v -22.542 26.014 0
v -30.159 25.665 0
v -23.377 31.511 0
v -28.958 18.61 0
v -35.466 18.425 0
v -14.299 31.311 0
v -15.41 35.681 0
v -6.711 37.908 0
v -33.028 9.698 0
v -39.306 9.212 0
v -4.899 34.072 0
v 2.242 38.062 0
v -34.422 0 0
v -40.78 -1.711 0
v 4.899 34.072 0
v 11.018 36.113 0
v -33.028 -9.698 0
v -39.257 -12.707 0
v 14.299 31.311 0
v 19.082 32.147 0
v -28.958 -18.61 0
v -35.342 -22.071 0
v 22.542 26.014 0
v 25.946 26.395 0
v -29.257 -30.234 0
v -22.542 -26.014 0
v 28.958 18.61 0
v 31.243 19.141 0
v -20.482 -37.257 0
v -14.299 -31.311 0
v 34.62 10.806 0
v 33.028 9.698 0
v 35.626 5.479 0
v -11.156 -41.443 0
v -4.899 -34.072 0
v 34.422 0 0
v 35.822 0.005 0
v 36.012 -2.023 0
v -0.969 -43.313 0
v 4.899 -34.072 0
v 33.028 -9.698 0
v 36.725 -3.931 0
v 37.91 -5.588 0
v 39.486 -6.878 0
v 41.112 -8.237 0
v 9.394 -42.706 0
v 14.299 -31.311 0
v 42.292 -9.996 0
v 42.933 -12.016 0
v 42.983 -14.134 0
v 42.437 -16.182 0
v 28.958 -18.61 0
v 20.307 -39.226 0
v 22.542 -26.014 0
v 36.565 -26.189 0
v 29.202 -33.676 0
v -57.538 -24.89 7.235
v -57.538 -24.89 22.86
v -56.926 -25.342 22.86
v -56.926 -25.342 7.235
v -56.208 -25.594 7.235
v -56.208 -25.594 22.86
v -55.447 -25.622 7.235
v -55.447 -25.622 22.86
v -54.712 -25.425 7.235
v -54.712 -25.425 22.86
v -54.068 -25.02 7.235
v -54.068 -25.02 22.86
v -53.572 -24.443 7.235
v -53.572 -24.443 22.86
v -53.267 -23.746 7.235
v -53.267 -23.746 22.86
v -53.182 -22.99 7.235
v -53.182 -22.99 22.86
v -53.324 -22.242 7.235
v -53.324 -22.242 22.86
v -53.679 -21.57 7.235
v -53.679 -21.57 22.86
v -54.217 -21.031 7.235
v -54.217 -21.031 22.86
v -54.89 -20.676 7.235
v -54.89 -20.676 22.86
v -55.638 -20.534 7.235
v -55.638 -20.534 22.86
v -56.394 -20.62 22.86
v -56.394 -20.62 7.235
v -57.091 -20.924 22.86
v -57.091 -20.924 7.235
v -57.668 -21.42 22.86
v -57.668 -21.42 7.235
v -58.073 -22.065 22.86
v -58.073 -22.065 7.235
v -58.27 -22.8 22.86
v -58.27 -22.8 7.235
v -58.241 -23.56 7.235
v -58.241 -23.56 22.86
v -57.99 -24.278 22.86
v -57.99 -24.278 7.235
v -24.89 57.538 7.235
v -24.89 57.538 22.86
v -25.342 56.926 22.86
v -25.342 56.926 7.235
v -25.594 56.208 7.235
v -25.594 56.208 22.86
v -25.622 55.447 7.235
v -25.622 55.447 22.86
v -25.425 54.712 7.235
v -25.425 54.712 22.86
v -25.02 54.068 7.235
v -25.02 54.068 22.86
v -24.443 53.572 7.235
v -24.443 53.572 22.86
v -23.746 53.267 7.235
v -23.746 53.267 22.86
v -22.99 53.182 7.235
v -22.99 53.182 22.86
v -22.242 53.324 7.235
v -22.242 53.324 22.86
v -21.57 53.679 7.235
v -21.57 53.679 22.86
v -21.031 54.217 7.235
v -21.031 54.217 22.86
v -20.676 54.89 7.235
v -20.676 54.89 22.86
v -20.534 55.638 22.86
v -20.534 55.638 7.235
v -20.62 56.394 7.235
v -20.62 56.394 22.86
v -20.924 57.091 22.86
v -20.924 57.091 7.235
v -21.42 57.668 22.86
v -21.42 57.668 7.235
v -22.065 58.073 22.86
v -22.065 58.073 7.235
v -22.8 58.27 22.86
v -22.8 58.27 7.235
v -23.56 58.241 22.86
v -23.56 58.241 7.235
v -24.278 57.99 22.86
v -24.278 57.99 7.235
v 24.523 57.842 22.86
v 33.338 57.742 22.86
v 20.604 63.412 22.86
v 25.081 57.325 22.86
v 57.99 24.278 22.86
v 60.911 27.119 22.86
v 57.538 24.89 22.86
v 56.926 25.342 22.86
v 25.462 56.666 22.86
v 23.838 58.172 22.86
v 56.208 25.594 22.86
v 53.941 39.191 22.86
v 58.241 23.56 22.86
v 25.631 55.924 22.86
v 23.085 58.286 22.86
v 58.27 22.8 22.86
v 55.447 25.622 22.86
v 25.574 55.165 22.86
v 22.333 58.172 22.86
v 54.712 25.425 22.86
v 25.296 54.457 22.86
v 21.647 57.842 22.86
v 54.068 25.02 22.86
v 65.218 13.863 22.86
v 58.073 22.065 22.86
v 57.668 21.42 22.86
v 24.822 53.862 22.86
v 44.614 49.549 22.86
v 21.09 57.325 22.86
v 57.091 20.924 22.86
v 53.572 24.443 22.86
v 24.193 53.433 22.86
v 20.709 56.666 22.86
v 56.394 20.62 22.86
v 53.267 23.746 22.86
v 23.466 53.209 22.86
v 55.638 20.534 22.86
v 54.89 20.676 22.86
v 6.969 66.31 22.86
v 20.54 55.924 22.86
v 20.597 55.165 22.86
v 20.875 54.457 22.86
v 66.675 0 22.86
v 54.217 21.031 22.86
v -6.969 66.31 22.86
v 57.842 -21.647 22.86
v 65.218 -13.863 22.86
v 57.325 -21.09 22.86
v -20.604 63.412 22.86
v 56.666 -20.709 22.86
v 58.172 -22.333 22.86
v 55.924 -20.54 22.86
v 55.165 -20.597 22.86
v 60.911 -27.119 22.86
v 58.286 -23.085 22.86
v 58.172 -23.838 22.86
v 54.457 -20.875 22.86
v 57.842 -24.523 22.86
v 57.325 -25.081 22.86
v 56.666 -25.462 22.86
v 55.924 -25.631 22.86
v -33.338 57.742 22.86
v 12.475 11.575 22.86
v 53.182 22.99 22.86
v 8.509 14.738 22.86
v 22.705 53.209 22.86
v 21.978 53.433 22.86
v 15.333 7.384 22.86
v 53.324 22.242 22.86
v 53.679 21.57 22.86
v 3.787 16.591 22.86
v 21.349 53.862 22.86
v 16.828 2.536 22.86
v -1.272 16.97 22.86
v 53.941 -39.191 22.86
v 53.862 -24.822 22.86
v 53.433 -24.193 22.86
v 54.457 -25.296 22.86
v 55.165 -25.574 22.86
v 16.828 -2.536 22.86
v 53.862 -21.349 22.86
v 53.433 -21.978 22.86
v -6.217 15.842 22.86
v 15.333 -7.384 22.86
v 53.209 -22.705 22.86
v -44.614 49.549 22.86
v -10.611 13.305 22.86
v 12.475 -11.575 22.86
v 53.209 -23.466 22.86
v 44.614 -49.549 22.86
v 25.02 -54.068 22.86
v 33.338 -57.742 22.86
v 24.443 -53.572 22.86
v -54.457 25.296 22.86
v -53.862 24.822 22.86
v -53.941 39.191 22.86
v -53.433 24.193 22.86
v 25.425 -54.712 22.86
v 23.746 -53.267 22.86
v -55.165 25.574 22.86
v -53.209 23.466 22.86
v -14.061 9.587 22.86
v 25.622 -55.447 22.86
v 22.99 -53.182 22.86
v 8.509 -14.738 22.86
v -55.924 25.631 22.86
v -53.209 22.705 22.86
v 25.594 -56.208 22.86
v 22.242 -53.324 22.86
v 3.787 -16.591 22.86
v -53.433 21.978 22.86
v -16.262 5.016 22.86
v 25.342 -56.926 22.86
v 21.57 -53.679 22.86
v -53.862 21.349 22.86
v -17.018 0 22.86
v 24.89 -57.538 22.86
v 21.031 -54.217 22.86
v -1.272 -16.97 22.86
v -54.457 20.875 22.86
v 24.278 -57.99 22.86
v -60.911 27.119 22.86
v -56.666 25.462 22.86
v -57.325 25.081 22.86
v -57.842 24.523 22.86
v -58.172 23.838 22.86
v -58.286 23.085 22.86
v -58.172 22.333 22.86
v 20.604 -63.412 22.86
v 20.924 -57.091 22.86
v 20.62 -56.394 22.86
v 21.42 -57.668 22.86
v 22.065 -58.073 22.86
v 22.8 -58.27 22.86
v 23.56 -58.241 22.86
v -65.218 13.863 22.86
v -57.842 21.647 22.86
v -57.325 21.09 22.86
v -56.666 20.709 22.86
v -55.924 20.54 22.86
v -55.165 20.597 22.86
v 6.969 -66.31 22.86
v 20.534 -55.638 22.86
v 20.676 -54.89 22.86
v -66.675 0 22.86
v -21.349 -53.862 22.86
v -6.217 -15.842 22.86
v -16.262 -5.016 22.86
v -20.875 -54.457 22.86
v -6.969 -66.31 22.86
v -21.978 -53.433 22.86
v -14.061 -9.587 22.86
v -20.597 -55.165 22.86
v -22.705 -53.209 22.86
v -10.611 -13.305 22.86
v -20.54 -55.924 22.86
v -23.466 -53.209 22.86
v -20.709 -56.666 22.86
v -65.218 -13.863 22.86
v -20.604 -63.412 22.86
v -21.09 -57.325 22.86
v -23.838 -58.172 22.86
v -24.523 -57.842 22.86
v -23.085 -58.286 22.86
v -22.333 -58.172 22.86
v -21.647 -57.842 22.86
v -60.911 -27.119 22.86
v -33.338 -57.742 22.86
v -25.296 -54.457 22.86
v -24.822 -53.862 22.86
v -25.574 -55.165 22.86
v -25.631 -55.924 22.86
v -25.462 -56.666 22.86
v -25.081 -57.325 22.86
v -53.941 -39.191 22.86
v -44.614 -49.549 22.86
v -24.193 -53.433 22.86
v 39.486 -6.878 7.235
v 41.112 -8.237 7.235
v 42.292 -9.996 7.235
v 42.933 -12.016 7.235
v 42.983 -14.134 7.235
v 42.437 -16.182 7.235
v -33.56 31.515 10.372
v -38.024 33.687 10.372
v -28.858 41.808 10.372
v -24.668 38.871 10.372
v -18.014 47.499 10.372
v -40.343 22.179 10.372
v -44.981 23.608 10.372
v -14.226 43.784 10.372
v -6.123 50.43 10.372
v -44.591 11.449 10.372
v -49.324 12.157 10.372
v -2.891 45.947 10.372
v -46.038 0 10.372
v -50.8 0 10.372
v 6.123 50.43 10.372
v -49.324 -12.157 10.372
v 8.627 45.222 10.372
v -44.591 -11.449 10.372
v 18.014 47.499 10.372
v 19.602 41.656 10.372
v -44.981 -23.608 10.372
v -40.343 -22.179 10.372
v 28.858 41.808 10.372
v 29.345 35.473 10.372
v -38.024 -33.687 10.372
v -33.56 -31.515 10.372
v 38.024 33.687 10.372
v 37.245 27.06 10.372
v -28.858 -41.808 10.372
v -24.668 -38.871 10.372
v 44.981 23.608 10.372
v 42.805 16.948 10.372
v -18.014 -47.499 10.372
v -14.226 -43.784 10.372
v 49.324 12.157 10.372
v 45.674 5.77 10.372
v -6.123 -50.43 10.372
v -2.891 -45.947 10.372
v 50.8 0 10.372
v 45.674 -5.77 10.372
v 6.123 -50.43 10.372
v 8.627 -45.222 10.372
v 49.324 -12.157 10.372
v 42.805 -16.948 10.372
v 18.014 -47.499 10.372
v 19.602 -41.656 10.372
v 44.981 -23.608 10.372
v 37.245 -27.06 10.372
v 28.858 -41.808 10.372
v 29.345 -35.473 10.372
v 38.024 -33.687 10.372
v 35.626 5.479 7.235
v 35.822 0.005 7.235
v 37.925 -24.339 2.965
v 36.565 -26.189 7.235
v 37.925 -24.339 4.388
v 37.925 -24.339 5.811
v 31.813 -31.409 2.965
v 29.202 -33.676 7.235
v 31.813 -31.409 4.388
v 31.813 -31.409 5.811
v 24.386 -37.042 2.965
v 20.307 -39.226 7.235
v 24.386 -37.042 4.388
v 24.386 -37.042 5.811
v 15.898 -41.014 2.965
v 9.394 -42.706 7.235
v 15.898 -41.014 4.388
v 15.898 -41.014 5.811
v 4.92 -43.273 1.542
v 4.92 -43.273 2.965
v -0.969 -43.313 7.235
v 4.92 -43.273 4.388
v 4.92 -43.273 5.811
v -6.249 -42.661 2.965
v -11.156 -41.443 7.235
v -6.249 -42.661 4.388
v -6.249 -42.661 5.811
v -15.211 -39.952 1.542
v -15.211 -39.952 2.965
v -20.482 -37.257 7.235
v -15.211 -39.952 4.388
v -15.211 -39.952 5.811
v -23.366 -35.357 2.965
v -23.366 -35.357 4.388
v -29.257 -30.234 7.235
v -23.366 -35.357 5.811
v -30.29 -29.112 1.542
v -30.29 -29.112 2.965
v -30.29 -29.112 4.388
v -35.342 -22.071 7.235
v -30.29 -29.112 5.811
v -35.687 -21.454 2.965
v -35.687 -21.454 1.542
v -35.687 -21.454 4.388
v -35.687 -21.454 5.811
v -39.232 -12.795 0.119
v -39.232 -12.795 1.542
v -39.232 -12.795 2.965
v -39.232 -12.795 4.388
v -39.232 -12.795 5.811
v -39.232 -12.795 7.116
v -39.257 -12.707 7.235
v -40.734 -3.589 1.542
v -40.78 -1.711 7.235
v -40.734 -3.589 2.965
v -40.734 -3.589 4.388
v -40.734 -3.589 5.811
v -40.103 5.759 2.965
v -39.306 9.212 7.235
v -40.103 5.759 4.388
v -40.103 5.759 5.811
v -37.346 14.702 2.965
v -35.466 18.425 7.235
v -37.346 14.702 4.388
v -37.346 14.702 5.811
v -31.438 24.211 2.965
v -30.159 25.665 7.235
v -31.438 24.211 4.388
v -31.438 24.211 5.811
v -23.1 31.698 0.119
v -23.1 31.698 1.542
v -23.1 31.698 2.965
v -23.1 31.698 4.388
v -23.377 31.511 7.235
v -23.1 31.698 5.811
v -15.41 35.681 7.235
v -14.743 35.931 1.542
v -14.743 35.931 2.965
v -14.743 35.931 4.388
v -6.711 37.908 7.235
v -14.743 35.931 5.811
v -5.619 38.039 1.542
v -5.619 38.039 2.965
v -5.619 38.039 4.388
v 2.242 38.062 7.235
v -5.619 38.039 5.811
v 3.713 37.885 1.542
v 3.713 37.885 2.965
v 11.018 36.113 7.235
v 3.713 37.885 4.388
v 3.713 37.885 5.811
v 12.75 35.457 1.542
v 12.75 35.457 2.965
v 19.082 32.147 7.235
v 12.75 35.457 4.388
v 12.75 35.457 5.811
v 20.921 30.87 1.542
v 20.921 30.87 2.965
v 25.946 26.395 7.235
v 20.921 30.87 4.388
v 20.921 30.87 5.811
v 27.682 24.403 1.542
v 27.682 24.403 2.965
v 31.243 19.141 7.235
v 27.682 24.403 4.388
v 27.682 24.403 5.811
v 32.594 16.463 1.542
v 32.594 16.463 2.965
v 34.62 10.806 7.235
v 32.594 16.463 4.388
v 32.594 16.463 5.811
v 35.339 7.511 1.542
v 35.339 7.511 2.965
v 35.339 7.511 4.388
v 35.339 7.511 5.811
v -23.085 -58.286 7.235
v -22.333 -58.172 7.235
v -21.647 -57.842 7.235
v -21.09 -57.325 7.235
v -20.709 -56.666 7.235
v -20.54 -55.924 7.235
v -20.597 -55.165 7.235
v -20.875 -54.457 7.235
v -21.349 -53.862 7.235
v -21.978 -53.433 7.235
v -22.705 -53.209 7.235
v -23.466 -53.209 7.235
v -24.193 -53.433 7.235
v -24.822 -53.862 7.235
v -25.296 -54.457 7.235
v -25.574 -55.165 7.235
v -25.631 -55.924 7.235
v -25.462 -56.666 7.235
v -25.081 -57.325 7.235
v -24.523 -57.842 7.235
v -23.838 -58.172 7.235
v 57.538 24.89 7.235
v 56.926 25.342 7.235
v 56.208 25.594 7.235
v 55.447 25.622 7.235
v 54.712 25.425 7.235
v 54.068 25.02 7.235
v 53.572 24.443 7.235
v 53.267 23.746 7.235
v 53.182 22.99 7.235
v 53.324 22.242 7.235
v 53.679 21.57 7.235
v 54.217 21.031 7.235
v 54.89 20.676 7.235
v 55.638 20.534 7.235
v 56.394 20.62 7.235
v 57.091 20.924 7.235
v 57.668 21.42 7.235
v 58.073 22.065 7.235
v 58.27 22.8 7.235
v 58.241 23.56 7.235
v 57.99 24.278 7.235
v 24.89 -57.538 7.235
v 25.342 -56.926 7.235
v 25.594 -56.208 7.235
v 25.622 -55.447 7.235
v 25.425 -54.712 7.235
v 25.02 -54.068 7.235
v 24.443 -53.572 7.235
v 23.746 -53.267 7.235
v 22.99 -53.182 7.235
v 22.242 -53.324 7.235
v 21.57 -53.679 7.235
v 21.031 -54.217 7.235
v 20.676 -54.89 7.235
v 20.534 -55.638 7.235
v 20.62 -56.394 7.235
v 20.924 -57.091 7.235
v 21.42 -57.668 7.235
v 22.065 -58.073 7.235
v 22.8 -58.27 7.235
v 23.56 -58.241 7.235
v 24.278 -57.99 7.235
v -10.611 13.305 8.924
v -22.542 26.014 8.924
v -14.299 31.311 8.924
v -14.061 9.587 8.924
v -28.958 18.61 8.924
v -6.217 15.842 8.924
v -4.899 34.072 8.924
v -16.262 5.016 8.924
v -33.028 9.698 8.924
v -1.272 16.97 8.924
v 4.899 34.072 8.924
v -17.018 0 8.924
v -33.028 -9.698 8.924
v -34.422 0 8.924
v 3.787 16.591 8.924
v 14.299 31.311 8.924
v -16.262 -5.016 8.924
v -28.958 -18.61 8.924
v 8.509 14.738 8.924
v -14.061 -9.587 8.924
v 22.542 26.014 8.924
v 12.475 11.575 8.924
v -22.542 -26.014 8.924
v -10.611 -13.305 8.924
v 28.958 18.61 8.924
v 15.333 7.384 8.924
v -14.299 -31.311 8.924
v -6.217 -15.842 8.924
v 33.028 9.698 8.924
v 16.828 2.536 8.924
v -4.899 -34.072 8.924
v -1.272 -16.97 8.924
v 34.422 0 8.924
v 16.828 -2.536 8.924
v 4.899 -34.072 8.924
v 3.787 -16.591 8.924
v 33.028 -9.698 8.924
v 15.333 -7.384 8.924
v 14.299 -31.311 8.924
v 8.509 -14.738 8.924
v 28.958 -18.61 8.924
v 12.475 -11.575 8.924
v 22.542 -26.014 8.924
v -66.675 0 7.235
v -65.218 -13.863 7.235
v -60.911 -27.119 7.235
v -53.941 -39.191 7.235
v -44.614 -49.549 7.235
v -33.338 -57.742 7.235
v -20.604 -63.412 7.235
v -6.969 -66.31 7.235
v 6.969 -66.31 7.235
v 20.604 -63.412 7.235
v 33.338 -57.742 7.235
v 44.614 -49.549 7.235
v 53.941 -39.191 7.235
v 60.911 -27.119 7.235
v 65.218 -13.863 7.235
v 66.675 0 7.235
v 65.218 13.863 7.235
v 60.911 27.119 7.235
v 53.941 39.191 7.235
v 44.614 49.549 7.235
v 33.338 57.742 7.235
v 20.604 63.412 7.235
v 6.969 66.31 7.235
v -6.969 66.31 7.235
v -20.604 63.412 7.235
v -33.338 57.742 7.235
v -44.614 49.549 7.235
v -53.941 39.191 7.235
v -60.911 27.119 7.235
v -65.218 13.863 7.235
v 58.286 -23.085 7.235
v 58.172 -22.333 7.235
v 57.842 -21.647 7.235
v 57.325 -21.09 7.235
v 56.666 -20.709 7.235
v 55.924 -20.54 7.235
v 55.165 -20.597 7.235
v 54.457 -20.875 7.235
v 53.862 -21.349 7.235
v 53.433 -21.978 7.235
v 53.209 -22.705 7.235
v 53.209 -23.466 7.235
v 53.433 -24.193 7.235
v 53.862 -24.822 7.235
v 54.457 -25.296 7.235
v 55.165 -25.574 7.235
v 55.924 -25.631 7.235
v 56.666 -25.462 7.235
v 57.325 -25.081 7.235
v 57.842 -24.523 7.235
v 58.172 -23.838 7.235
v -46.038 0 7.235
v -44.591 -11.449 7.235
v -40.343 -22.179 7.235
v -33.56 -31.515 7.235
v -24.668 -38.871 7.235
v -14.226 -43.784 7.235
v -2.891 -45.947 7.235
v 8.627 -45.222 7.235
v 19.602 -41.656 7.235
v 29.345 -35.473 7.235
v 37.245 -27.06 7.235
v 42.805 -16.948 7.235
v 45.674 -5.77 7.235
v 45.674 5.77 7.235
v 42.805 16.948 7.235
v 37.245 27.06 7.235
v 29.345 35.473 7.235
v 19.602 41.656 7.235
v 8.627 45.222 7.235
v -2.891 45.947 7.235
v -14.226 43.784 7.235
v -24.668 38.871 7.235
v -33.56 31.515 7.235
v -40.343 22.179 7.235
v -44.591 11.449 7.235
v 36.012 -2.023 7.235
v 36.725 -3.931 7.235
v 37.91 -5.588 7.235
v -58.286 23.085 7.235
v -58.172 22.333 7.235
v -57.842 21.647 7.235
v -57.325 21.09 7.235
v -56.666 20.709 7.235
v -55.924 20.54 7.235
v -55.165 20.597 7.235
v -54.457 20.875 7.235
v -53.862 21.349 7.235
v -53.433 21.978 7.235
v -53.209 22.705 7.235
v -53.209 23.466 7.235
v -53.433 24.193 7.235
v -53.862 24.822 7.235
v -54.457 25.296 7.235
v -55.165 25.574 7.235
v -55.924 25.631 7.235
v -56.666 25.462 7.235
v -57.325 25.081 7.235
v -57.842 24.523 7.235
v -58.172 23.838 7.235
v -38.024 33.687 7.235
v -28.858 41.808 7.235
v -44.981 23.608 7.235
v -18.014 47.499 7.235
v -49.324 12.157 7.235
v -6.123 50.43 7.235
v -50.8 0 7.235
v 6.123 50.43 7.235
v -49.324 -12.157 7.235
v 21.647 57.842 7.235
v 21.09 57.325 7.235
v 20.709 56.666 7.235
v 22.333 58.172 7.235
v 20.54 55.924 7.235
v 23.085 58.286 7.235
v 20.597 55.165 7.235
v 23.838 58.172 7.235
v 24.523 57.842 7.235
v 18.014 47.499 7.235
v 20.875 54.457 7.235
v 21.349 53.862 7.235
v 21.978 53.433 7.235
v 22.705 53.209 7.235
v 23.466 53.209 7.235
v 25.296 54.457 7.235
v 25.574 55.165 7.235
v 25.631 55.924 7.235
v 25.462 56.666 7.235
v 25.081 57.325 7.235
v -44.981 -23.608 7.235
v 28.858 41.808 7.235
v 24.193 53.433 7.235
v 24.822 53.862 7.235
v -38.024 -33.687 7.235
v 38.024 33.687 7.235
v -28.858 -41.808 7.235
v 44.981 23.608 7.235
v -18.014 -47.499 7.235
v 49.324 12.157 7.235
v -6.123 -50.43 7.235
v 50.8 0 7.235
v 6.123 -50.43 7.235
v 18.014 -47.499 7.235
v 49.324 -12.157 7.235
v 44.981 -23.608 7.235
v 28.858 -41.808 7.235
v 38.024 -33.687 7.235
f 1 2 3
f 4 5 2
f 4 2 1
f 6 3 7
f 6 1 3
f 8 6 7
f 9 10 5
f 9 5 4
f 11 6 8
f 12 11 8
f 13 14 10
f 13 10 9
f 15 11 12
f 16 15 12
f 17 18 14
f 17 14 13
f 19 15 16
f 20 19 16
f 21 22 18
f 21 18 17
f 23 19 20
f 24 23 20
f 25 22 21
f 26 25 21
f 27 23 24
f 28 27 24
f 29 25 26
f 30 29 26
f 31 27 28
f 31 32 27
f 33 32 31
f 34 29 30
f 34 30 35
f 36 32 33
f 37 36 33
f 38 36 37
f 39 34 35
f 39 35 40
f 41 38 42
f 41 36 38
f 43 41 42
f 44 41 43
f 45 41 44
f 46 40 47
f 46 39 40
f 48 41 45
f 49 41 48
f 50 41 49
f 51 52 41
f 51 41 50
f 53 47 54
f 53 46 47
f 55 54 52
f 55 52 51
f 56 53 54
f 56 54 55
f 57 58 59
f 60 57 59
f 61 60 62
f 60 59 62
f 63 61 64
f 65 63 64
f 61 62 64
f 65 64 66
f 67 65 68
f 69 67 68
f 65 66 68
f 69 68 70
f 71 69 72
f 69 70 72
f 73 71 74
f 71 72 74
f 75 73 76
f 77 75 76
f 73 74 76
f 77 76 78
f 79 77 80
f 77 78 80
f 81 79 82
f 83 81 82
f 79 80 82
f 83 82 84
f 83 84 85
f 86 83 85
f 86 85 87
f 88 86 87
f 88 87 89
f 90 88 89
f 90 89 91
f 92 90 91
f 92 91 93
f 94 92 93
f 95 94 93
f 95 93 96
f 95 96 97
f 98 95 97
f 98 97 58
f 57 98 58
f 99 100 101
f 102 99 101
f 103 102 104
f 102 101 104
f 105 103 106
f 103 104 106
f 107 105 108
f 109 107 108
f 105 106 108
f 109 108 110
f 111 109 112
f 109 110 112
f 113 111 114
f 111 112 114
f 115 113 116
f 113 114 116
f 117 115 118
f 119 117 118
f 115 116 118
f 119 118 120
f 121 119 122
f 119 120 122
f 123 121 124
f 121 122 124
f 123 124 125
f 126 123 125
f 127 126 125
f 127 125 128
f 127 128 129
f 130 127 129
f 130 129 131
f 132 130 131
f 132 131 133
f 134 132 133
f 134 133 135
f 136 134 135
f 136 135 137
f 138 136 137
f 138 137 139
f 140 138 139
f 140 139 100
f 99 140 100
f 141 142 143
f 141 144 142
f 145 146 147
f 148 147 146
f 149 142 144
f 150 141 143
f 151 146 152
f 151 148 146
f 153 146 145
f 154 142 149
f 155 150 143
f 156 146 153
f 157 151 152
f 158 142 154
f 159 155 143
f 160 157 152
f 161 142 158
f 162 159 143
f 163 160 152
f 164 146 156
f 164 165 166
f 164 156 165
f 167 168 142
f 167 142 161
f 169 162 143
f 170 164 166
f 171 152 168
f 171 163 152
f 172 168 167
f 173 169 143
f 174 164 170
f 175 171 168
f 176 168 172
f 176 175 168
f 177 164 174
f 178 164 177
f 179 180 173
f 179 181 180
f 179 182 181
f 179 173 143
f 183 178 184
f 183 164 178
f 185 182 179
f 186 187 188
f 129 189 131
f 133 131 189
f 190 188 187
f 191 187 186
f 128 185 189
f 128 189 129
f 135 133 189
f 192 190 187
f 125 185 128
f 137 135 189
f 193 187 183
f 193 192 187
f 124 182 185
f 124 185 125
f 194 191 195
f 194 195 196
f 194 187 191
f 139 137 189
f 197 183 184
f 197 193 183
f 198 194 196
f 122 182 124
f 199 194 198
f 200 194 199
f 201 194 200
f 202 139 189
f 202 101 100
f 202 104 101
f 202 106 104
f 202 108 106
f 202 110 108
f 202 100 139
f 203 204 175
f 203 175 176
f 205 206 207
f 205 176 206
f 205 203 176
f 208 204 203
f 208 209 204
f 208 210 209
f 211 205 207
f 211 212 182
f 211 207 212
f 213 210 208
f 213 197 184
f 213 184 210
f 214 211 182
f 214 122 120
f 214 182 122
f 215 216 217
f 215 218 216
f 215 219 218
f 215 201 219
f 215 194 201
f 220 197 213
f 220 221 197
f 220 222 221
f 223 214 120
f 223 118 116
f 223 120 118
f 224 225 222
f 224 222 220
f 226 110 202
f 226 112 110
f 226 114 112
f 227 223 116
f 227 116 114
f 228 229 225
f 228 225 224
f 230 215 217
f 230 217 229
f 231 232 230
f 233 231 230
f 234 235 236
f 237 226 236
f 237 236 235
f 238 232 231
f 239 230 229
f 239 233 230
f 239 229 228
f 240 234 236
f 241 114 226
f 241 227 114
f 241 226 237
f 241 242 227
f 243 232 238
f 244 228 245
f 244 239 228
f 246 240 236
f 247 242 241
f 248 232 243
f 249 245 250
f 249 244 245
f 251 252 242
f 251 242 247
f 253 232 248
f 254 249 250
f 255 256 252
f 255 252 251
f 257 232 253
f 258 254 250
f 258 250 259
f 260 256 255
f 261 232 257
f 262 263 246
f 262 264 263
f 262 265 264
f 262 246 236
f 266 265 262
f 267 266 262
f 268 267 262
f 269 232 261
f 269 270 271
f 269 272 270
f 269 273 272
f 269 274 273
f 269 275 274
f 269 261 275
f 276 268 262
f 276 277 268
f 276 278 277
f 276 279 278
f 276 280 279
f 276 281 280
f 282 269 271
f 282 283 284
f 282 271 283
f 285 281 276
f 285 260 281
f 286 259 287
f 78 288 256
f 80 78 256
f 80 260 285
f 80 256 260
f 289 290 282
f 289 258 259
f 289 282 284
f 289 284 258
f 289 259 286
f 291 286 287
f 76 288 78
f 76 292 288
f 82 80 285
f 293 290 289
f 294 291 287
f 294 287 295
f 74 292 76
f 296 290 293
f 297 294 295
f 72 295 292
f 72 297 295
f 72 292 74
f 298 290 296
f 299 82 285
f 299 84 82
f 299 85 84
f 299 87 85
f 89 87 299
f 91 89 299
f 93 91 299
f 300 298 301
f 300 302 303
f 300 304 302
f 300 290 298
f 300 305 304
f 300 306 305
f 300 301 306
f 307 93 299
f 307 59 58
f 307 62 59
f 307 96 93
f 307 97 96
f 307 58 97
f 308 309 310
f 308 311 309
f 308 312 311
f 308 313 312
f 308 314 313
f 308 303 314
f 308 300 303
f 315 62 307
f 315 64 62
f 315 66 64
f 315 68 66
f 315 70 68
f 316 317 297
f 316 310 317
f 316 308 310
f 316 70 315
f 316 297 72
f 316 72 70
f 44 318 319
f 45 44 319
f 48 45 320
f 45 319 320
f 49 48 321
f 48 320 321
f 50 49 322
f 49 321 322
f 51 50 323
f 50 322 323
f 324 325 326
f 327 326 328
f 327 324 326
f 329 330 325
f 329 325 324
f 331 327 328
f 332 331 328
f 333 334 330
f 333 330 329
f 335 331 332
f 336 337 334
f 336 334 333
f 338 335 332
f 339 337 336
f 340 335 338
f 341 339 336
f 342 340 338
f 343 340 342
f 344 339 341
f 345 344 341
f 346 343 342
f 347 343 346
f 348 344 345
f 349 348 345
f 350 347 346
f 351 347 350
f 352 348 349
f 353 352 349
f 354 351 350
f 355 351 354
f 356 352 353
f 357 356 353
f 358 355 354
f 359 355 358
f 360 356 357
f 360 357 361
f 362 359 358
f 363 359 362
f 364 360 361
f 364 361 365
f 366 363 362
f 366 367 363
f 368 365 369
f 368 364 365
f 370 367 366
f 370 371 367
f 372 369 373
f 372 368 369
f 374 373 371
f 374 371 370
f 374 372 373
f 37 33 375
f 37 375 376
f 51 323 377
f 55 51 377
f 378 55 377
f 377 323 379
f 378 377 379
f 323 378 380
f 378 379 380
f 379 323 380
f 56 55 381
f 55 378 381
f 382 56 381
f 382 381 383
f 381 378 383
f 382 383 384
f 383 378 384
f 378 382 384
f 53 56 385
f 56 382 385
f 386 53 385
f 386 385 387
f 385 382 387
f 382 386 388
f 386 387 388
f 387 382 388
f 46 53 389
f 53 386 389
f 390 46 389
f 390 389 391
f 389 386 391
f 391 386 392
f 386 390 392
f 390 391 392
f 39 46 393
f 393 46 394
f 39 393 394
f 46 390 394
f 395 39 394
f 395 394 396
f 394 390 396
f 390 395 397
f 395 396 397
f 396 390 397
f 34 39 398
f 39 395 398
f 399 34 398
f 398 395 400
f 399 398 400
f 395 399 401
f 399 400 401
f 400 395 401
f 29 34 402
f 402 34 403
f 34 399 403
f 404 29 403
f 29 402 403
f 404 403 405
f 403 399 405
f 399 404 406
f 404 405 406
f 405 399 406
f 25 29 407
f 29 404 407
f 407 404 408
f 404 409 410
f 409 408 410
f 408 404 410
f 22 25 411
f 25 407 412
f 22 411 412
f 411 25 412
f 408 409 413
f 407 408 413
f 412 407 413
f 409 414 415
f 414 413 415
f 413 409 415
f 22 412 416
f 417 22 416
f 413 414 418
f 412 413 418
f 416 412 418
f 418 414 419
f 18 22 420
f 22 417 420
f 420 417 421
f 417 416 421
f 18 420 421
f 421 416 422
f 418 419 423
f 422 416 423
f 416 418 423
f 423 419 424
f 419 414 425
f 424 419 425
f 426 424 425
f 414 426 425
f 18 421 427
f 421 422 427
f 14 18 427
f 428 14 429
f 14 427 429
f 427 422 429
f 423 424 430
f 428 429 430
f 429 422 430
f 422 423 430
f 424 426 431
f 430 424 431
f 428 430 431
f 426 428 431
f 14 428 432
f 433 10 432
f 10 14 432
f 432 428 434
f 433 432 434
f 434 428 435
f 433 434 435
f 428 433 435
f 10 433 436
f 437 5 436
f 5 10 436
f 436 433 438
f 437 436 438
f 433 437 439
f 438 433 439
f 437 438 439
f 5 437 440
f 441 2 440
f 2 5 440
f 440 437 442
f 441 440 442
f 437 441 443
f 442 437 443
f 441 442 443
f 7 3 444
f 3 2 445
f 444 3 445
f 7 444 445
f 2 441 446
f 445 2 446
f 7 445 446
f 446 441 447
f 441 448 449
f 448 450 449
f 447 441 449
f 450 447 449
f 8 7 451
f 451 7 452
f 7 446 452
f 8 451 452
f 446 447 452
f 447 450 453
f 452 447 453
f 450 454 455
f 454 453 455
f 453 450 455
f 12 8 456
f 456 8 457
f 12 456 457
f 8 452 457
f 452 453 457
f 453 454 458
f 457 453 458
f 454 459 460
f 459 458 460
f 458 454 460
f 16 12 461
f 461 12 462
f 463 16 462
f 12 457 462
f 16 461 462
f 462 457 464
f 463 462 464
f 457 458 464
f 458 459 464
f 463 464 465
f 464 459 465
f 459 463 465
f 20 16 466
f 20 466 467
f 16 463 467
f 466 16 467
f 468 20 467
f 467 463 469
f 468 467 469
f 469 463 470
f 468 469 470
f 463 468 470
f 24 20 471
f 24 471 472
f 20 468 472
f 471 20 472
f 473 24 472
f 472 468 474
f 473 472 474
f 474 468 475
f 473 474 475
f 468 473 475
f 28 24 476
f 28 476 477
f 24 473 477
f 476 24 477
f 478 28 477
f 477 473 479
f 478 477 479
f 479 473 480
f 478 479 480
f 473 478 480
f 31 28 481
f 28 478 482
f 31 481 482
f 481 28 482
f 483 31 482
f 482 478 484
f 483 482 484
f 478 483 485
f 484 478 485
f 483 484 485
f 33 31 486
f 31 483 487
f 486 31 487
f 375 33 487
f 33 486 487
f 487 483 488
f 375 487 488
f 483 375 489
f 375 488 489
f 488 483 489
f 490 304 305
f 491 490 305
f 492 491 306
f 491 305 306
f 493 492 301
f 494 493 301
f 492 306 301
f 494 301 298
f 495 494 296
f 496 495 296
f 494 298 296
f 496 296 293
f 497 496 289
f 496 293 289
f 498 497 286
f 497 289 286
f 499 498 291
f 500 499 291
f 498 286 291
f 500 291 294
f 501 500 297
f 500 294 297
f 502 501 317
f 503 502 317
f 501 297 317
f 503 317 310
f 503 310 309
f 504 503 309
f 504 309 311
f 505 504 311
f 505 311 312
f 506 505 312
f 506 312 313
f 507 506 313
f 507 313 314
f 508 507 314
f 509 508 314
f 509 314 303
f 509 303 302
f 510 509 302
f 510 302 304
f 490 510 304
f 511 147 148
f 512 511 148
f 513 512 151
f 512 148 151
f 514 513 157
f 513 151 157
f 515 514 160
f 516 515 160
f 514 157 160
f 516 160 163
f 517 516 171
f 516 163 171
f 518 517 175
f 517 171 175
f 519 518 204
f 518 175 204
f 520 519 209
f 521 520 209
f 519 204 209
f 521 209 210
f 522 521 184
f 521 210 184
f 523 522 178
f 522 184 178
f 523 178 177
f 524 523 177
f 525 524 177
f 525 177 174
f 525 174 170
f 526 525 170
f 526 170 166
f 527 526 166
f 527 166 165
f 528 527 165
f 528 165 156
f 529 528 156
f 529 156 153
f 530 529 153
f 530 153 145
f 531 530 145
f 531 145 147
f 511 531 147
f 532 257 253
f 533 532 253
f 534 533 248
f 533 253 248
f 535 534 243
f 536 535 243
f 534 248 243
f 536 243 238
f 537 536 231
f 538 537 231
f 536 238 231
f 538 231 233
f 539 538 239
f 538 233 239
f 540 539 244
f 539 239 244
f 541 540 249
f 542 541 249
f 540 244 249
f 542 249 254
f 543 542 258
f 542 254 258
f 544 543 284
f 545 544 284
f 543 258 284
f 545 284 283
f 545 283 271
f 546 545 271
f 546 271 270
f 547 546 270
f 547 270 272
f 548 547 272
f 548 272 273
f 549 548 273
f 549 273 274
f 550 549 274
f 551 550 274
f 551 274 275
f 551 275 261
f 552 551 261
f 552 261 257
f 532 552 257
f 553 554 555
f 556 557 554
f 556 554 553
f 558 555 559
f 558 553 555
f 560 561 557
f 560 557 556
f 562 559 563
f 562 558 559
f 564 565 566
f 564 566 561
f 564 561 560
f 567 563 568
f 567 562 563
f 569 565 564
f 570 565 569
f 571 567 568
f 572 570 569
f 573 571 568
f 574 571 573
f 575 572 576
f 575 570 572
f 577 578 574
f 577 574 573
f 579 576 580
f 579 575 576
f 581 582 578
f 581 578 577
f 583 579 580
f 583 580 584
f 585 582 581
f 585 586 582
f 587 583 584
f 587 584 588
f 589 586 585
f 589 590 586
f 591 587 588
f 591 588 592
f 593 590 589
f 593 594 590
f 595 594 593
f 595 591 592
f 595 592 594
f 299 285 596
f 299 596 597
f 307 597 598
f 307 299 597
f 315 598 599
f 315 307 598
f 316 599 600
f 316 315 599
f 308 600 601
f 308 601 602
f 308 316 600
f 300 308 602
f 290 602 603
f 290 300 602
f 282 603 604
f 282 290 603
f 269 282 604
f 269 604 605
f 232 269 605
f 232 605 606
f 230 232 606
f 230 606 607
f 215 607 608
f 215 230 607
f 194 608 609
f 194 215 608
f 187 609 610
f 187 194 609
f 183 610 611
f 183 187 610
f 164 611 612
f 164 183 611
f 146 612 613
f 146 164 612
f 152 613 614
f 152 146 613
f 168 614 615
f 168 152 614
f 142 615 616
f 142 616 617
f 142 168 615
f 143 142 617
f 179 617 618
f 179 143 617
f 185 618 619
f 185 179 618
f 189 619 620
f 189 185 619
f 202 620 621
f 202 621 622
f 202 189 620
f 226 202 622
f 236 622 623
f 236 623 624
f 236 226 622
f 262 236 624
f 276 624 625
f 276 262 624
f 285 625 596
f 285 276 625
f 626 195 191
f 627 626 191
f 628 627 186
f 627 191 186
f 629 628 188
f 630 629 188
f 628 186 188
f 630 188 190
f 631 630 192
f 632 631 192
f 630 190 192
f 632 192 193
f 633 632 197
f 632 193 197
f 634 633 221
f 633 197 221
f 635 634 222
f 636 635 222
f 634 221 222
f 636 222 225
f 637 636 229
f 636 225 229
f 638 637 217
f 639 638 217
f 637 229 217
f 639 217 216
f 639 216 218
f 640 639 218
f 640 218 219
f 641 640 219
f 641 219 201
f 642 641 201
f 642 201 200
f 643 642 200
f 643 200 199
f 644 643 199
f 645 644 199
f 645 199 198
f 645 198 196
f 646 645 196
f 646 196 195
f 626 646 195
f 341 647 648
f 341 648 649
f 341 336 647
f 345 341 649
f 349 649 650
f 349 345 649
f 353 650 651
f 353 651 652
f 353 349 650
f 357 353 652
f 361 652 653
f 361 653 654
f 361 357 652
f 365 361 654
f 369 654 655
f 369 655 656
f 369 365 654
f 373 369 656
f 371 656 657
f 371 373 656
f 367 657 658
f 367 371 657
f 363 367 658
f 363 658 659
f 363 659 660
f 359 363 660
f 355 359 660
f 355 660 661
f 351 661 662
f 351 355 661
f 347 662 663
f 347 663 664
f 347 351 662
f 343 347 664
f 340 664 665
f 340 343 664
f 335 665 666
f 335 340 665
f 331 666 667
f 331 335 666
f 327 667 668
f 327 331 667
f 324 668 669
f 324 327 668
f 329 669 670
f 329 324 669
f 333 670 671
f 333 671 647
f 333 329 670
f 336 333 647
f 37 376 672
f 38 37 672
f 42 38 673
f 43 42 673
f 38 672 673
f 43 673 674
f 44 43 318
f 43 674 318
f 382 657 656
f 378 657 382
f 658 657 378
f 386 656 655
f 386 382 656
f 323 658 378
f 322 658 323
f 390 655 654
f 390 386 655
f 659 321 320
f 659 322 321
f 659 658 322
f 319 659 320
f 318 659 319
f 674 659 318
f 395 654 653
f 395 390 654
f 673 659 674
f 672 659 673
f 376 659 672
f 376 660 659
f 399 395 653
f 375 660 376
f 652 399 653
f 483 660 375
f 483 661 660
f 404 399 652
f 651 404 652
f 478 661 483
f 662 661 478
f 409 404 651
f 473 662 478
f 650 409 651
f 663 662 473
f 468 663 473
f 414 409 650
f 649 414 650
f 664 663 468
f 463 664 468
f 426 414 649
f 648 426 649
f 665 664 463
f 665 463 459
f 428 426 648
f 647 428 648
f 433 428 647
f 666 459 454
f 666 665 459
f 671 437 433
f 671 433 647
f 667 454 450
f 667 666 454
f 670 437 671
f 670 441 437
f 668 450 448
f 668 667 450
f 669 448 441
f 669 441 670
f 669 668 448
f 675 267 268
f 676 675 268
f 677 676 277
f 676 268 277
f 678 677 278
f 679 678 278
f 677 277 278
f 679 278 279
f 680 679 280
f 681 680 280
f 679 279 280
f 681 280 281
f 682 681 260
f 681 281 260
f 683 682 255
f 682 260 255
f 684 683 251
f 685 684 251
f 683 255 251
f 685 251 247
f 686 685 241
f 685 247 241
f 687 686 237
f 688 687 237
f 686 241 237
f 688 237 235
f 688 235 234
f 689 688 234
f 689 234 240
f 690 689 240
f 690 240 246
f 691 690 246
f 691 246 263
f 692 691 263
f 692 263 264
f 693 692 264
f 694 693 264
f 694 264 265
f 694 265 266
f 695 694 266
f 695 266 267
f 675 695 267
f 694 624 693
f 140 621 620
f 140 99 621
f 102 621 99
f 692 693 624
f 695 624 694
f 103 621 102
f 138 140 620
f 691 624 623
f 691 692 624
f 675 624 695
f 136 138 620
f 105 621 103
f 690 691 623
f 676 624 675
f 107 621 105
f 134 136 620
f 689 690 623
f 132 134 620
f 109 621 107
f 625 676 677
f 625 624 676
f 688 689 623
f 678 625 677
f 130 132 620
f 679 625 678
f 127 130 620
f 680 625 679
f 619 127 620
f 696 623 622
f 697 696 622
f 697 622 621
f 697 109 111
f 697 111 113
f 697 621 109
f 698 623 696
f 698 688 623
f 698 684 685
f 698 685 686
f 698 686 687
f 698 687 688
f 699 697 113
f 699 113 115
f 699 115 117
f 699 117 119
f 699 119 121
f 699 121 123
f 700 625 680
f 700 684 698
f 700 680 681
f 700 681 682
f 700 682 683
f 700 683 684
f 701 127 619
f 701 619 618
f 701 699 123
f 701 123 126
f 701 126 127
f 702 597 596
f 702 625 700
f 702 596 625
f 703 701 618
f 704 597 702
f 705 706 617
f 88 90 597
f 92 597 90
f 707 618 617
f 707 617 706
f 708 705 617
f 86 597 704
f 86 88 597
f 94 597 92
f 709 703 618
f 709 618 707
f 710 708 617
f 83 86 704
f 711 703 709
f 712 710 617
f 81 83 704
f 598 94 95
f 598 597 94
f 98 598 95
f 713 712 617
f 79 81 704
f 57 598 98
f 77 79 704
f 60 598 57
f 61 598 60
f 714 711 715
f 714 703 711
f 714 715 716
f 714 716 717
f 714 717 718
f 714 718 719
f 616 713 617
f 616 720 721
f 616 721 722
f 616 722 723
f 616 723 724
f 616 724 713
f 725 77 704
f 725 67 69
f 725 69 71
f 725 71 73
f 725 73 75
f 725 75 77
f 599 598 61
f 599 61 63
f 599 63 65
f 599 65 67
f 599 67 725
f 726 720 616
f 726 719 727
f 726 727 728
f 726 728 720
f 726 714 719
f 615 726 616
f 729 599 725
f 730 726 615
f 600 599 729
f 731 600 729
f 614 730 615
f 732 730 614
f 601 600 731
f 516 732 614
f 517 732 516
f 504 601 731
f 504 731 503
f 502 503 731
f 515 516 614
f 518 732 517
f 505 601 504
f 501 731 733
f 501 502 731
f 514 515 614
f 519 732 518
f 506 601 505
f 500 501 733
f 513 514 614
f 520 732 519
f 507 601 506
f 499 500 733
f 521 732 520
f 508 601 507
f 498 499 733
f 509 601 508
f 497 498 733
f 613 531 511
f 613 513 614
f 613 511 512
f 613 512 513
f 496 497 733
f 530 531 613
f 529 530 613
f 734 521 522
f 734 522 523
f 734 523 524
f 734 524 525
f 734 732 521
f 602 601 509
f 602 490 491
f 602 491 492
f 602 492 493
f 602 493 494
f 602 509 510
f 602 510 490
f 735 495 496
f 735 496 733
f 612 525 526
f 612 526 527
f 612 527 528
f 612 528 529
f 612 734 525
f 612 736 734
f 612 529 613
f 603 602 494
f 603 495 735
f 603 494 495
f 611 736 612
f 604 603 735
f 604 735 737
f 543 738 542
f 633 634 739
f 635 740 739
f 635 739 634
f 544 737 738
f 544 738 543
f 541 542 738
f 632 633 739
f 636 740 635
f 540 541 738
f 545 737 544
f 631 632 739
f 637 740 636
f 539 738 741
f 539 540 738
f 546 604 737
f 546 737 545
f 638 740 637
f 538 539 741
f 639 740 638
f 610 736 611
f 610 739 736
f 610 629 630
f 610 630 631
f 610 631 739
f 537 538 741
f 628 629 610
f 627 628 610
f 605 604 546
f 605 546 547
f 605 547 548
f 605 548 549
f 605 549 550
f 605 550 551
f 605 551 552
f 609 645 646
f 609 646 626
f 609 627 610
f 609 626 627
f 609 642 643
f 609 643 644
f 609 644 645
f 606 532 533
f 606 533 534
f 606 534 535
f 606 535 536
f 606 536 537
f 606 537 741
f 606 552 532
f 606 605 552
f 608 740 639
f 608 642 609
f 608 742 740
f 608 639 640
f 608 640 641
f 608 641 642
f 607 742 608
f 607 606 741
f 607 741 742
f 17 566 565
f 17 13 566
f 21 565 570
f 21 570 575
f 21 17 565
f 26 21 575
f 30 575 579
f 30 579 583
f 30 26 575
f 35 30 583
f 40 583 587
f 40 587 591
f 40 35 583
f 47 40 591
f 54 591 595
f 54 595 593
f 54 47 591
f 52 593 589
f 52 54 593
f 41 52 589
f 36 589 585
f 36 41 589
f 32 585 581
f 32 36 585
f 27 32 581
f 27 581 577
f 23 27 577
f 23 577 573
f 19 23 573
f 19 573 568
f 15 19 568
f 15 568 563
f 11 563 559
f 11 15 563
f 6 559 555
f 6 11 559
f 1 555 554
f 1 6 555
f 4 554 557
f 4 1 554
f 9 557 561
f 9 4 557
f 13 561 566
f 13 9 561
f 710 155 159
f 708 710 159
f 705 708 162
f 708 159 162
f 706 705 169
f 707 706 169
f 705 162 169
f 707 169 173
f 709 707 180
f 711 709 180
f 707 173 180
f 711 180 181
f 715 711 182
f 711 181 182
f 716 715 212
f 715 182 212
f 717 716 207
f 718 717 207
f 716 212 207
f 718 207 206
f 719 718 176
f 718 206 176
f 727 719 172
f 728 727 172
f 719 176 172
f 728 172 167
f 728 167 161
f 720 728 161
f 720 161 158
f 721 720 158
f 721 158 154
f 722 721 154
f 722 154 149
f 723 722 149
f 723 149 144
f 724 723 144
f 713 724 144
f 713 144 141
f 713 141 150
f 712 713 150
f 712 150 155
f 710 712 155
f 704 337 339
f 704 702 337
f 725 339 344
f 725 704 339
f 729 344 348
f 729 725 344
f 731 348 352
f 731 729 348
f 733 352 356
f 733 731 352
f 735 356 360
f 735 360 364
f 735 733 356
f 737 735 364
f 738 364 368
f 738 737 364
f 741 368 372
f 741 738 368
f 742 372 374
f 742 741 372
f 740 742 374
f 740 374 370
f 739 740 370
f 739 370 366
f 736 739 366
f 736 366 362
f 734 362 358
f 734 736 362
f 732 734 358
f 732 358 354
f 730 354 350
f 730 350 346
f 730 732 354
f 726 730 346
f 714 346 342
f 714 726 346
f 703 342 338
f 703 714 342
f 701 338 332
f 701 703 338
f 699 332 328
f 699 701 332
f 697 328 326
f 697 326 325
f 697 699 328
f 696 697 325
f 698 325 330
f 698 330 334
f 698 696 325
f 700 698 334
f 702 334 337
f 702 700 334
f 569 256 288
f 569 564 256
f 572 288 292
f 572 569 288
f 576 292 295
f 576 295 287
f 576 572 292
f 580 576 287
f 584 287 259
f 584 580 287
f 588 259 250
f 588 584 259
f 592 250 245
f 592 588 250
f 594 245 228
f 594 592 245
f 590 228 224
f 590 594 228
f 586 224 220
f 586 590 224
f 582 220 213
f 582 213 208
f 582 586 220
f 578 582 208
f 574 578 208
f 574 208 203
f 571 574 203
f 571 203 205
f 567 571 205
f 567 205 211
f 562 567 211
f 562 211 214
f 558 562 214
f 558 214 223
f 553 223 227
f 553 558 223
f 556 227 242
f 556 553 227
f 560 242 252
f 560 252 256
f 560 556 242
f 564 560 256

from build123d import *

# Parameters (mm, degrees)
CUT_EXTRUDE2_OUTLINE_R = 47.625
CUT_EXTRUDE2_DEPTH     = 7.234682
F_10_CLEARANCE_HOLE1_D = 5.1054
CIRPATTERN1_COUNT      = 8
CLEARANCING_START      = -7.234682
SKETCH25_R             = 66.675
CLEARANCING_DEPTH      = 7.234682


# Read off the part's stored shape, not the designer's step: Cut-Extrude2
with BuildPart() as part:
    # Sketch24 → Revolve1 (revolve)
    with BuildSketch(Plane(origin=(0, 0, 0), x_dir=(1, 0, 0), z_dir=(0, 1, 0))):
        Polygon((-17.018, -22.86), (-17.018, -8.923782), (-34.42208, -8.923782), (-34.42208, 0), (-47.625, 0), (-47.625, -7.234682), (-46.0375, -7.234682), (-46.0375, -10.371582), (-50.8, -10.371582), (-50.8, -7.234682), (-66.675, -7.234682), (-66.675, -22.86), align=None)
    revolve(axis=Axis((0, 0, -9.275318), (0, 0, 1)))

    # Cut-Extrude2 outline → Cut-Extrude2 (cut)
    with BuildSketch(Plane.XY):
        Circle(CUT_EXTRUDE2_OUTLINE_R)
        with BuildLine():
            add(Edge.make_bspline(
                [(35.948703812, 0), (35.9515816, 0.07538119), (35.957337916, 0.226162951), (35.964207937, 0.452426553), (35.969771157, 0.678783022), (35.978029534, 1.131847853), (35.980843708, 2.190601907), (35.920311441, 3.779931016), (35.747323363, 5.668216834), (35.489928088, 7.474298946), (35.141459932, 9.268877369), (34.702390603, 11.047358984), (34.17343386, 12.80516853), (33.555538624, 14.537761538), (32.849887572, 16.240636382), (32.057893687, 17.909346365), (31.181197352, 19.53951152), (30.221662701, 21.126830276), (29.181373626, 22.667090912), (28.062629225, 24.156182809), (26.867938753, 25.590107465), (25.60001603, 26.964989265), (24.261773335, 28.277085961), (22.856314773, 29.522798851), (21.386929147, 30.698682629), (19.85708232, 31.801454876), (18.270409111, 32.828005175), (16.630704717, 33.775403815), (14.941915703, 34.640910073), (13.208130556, 35.421980041), (11.43356985, 36.116273987), (9.622576022, 36.721663214), (7.779602801, 37.236236415), (5.909204301, 37.658305492), (4.016023818, 37.986410831), (2.104782347, 38.219326014), (0.180266852, 38.356061949), (-1.75268168, 38.395870413), (-3.689180377, 38.338246992), (-5.624316777, 38.182933409), (-7.553161251, 37.929919231), (-9.470779522, 37.579442948), (-11.37224525, 37.131992419), (-13.252652651, 36.588304682), (-15.107129112, 35.949365124), (-16.930847778, 35.216406011), (-18.719040078, 34.390904381), (-20.467008144, 33.474579298), (-22.170137115, 32.469388481), (-23.823907266, 31.377524301), (-25.42390596, 30.201409162), (-26.965839357, 28.943690275), (-28.445543888, 27.607233836), (-29.858997424, 26.195118613), (-31.202330147, 24.710628968), (-32.471835063, 23.157247319), (-33.663978152, 21.538646066), (-34.775408104, 19.858679), (-35.802965645, 18.121372202), (-36.743692396, 16.330914471), (-37.594839261, 14.491647299), (-38.353874308, 12.608054401), (-39.018490139, 10.68475085), (-39.586610697, 8.726471825), (-40.056397525, 6.738061006), (-40.426255434, 4.724458642), (-40.694837576, 2.690689328), (-40.861049894, 0.641849508), (-40.924054953, -1.416905249), (-40.883275123, -3.480373184), (-40.738395114, -5.543319447), (-40.489363842, -7.600489337), (-40.13639564, -9.646621653), (-39.679970776, -11.676462103), (-39.120835312, -13.684776759), (-38.460000265, -15.666365517), (-37.698740094, -17.61607551), (-36.838590511, -19.528814477), (-35.881345602, -21.399564006), (-34.829054288, -23.223392663), (-33.684016107, -24.995468936), (-32.44877635, -26.711073982), (-31.126120537, -28.365614138), (-29.719068263, -29.954633155), (-28.230866416, -31.473824138), (-26.664981791, -32.919041144), (-25.025093105, -34.286310417), (-23.315082441, -35.571841228), (-21.53902614, -36.772036288), (-19.701185153, -37.883501708), (-17.805994889, -38.903056478), (-15.85805457, -39.827741435), (-13.862116128, -40.654827709), (-11.823072667, -41.381824596), (-9.745946518, -42.006486871), (-7.635876912, -42.526821485), (-5.498107312, -42.941093656), (-3.337972426, -43.247832311), (-1.160884928, -43.445834888), (1.027678058, -43.534171454), (3.222188708, -43.512188152), (5.417082419, -43.379509955), (7.606771886, -43.136042707), (9.785661288, -42.781974466), (11.948160555, -42.317776118), (14.08869967, -41.74420128), (16.201742982, -41.062285471), (18.281803484, -40.273344558), (20.323457017, -39.378972487), (22.321356376, -38.381038284), (24.27024527, -37.281682345), (26.164972102, -36.083312015), (28.000503535, -34.788596469), (29.77193781, -33.400460899), (31.474517775, -31.92208003), (33.103643596, -30.356870964), (34.654885111, -28.708485383), (36.123993806, -26.980801118), (37.506914359, -25.17791311), (38.799795742, -23.304123775), (39.999001844, -21.363932809), (41.101121576, -19.362026441), (41.938186302, -17.641904891), (42.402189205, -16.588613759), (42.554027377, -16.231646763)],
                knots=[0, 0, 0, 0, 0.000879209, 0.001758645, 0.002638305, 0.003518191, 0.007039982, 0.014977213, 0.022047939, 0.029133237, 0.036233164, 0.043347773, 0.050477114, 0.057621232, 0.06478017, 0.071953969, 0.079142669, 0.086346306, 0.093564916, 0.100798534, 0.108047194, 0.115310927, 0.122589766, 0.12988374, 0.13719288, 0.144517215, 0.151856774, 0.159211583, 0.16658167, 0.173967063, 0.181367786, 0.188783866, 0.196215328, 0.203662198, 0.211124498, 0.218602253, 0.226095488, 0.233604225, 0.241128486, 0.248668296, 0.256223676, 0.263794648, 0.271381234, 0.278983456, 0.286601335, 0.294234891, 0.301884146, 0.309549121, 0.317229835, 0.324926308, 0.332638561, 0.340366614, 0.348110485, 0.355870195, 0.363645762, 0.371437205, 0.379244543, 0.387067795, 0.39490698, 0.402762115, 0.410633219, 0.41852031, 0.426423405, 0.434342523, 0.442277682, 0.450228898, 0.458196189, 0.466179572, 0.474179065, 0.482194684, 0.490226447, 0.498274369, 0.506338468, 0.514418761, 0.522515263, 0.530627991, 0.538756962, 0.546902191, 0.555063694, 0.563241488, 0.571435588, 0.57964601, 0.58787277, 0.596115883, 0.604375364, 0.61265123, 0.620943495, 0.629252175, 0.637577285, 0.64591884, 0.654276855, 0.662651345, 0.671042324, 0.679449808, 0.687873812, 0.696314349, 0.704771435, 0.713245083, 0.721735309, 0.730242127, 0.738765551, 0.747305595, 0.755862273, 0.7644356, 0.77302559, 0.781632256, 0.790255613, 0.798895674, 0.807552454, 0.816225965, 0.824916222, 0.833623239, 0.842347028, 0.851087604, 0.859844979, 0.868619169, 0.877410184, 0.88621804, 0.895042749, 0.903884325, 0.912742781, 0.921618129, 0.930510383, 0.935031581, 0.935031581, 0.935031581, 0.935031581], degree=3))
            ThreePointArc((35.948703812, 0), (36.836858206, -3.871377871), (39.552581276, -6.769865934))
            ThreePointArc((39.552581276, -6.769865934), (42.805320101, -10.94498561), (42.554027377, -16.231646763))
        make_face(mode=Mode.SUBTRACT)
    extrude(amount=CUT_EXTRUDE2_DEPTH, mode=Mode.SUBTRACT)

    # #10 Clearance Hole1 (through all)
    with Locations(Plane(origin=(55.733032799, -23.085378057, 7.234682), x_dir=(-1, 0, 0), z_dir=(0, 0, -1))):
        with Locations((0, 0)):
            f_10_clearance_hole1 = Hole(F_10_CLEARANCE_HOLE1_D / 2)

    # CirPattern1: #10 Clearance Hole1 ×8 about axis
    cirpattern1_axis = Axis((0, 0, 0), (0, 0, 1))
    for i in range(1, CIRPATTERN1_COUNT):
        add(f_10_clearance_hole1.rotate(cirpattern1_axis, i * 360 / CIRPATTERN1_COUNT), mode=Mode.SUBTRACT)

    # Sketch25 → Clearancing (cut)
    with BuildSketch(Plane(origin=(0, 0, 0), x_dir=(-1, 0, 0), z_dir=(0, 0, -1)).offset(CLEARANCING_START)):
        Circle(SKETCH25_R)
        with BuildLine():
            ThreePointArc((-39.485738347, -6.87785215), (-42.684264858, -10.983386498), (-42.437160346, -16.181936632))
            add(Edge.make_bspline(
                [(-42.437160346, -16.181936632), (-41.450328446, -18.501948894), (-40.287188075, -20.70386066), (-37.62426385, -24.882183045), (-36.1244575, -26.858578596), (-33.612918368, -29.647784963), (-32.727511557, -30.551787217), (-30.899288351, -32.26713978), (-29.954285679, -33.081629815), (-27.028415852, -35.398073541), (-24.957331886, -36.773902575), (-22.214143518, -38.277928099), (-21.657736444, -38.567871448), (-20.529077868, -39.125607363), (-19.957869924, -39.392805227), (-18.236811973, -40.153613466), (-17.074606136, -40.608998857), (-13.544408375, -41.82291337), (-11.1331575, -42.430323242), (-8.045152005, -42.931279628), (-7.423828634, -43.018467653), (-6.17358737, -43.166313281), (-5.545687994, -43.226778512), (-3.668882092, -43.366672694), (-2.421130233, -43.405411027), (1.311985825, -43.361475459), (3.787286298, -43.119848136), (7.47956464, -42.43089353), (8.712476258, -42.144649273), (11.128372813, -41.470614218), (12.31452175, -41.08278751), (15.808874803, -39.769919796), (18.053477953, -38.696639775), (21.289209419, -36.780985477), (22.349089848, -36.088250708), (24.383348169, -34.625595136), (25.362502881, -33.853290457), (28.188051648, -31.415612474), (29.923427118, -29.630442917), (31.900539288, -27.191684875), (32.287236817, -26.69215724), (33.03483793, -25.679954076), (33.395921295, -25.167211132), (34.441621812, -23.609372602), (35.088773016, -22.544710991), (36.882357275, -19.273503621), (37.882174946, -16.990390194), (38.875744828, -14.00270068), (39.061155114, -13.399331831), (39.402369545, -12.191519857), (39.558676578, -11.585611614), (39.985275792, -9.761961138), (40.441402975, -7.314651304), (40.674139412, -4.836063161), (40.763559938, -2.965202227), (40.779154388, -2.339591952), (40.781417609, -1.08432134), (40.76799572, -0.453052442), (40.627903307, 2.692390804), (40.286121576, 5.161443437), (39.43890774, 8.796132878), (39.100388573, 9.996140785), (38.308399323, 12.37248564), (37.852097598, 13.554391573), (36.333140039, 16.997228128), (35.119491675, 19.170506242), (33.001368487, 22.2498484), (32.245396403, 23.246004252), (31.033998954, 24.693258097), (30.616682544, 25.168342498), (29.765008734, 26.092546286), (29.329638676, 26.542937105), (27.105848432, 28.737227444), (25.177853658, 30.309665479), (22.580283298, 32.044782733), (22.051311937, 32.380188303), (20.974087609, 33.027312806), (20.424315753, 33.339806048), (18.760945416, 34.232685111), (17.631513907, 34.770110987), (14.183245166, 36.213360105), (11.805002439, 36.951757683), (8.729750366, 37.586018139), (8.107774126, 37.698555851), (6.863218919, 37.892276195), (6.240962177, 37.973521872), (4.374253461, 38.171221637), (1.88547224, 38.31227114), (-0.602985761, 38.211399864), (-2.469206159, 38.043607473), (-3.091259068, 37.972290691), (-4.335323004, 37.798308656), (-4.959105867, 37.695274824), (-8.05217871, 37.104825218), (-10.442064996, 36.396124759), (-13.903223174, 34.987468388), (-15.036178129, 34.459888971), (-16.703458261, 33.578668593), (-17.255286668, 33.26900823), (-18.337021034, 32.625547889), (-18.867738625, 32.291418051), (-21.471435266, 30.559817088), (-23.396215015, 28.98129219), (-25.602702171, 26.764423917), (-26.03392942, 26.30874761), (-26.875809699, 25.372259656), (-27.286623762, 24.891064324), (-28.473720562, 23.426447254), (-29.209796712, 22.416679591), (-31.255817918, 19.289573594), (-32.405286999, 17.075476116), (-33.791719154, 13.550670272), (-34.189829991, 12.359597052), (-34.85899573, 9.95467515), (-35.402182987, 7.524154989), (-35.69403317, 5.042564271), (-35.815892674, 3.161655555), (-35.840306869, 2.530241223), (-35.855853683, 1.267408077), (-35.845894895, 0.636088005), (-35.821796258, 0.004844883)],
                knots=[0, 0, 0, 0, 0.03125, 0.03125, 0.0625, 0.0625, 0.078125, 0.078125, 0.09375, 0.09375, 0.125, 0.125, 0.1328125, 0.1328125, 0.140625, 0.140625, 0.15625, 0.15625, 0.1875, 0.1875, 0.1953125, 0.1953125, 0.203125, 0.203125, 0.21875, 0.21875, 0.25, 0.25, 0.265625, 0.265625, 0.28125, 0.28125, 0.3125, 0.3125, 0.328125, 0.328125, 0.34375, 0.34375, 0.375, 0.375, 0.3828125, 0.3828125, 0.390625, 0.390625, 0.40625, 0.40625, 0.4375, 0.4375, 0.4453125, 0.4453125, 0.453125, 0.453125, 0.46875, 0.484375, 0.484375, 0.4921875, 0.4921875, 0.5, 0.5, 0.53125, 0.53125, 0.546875, 0.546875, 0.5625, 0.5625, 0.59375, 0.59375, 0.609375, 0.609375, 0.6171875, 0.6171875, 0.625, 0.625, 0.65625, 0.65625, 0.6640625, 0.6640625, 0.671875, 0.671875, 0.6875, 0.6875, 0.71875, 0.71875, 0.7265625, 0.7265625, 0.734375, 0.734375, 0.75, 0.765625, 0.765625, 0.7734375, 0.7734375, 0.78125, 0.78125, 0.8125, 0.8125, 0.828125, 0.828125, 0.8359375, 0.8359375, 0.84375, 0.84375, 0.875, 0.875, 0.8828125, 0.8828125, 0.890625, 0.890625, 0.90625, 0.90625, 0.9375, 0.9375, 0.953125, 0.953125, 0.96875, 0.984375, 0.984375, 0.9921875, 0.9921875, 1, 1, 1, 1], degree=3))
            ThreePointArc((-35.821796258, 0.004844883), (-36.724753226, -3.931055952), (-39.485738347, -6.87785215))
        make_face(mode=Mode.SUBTRACT)
    extrude(amount=CLEARANCING_DEPTH, mode=Mode.SUBTRACT)


solid = part.part
